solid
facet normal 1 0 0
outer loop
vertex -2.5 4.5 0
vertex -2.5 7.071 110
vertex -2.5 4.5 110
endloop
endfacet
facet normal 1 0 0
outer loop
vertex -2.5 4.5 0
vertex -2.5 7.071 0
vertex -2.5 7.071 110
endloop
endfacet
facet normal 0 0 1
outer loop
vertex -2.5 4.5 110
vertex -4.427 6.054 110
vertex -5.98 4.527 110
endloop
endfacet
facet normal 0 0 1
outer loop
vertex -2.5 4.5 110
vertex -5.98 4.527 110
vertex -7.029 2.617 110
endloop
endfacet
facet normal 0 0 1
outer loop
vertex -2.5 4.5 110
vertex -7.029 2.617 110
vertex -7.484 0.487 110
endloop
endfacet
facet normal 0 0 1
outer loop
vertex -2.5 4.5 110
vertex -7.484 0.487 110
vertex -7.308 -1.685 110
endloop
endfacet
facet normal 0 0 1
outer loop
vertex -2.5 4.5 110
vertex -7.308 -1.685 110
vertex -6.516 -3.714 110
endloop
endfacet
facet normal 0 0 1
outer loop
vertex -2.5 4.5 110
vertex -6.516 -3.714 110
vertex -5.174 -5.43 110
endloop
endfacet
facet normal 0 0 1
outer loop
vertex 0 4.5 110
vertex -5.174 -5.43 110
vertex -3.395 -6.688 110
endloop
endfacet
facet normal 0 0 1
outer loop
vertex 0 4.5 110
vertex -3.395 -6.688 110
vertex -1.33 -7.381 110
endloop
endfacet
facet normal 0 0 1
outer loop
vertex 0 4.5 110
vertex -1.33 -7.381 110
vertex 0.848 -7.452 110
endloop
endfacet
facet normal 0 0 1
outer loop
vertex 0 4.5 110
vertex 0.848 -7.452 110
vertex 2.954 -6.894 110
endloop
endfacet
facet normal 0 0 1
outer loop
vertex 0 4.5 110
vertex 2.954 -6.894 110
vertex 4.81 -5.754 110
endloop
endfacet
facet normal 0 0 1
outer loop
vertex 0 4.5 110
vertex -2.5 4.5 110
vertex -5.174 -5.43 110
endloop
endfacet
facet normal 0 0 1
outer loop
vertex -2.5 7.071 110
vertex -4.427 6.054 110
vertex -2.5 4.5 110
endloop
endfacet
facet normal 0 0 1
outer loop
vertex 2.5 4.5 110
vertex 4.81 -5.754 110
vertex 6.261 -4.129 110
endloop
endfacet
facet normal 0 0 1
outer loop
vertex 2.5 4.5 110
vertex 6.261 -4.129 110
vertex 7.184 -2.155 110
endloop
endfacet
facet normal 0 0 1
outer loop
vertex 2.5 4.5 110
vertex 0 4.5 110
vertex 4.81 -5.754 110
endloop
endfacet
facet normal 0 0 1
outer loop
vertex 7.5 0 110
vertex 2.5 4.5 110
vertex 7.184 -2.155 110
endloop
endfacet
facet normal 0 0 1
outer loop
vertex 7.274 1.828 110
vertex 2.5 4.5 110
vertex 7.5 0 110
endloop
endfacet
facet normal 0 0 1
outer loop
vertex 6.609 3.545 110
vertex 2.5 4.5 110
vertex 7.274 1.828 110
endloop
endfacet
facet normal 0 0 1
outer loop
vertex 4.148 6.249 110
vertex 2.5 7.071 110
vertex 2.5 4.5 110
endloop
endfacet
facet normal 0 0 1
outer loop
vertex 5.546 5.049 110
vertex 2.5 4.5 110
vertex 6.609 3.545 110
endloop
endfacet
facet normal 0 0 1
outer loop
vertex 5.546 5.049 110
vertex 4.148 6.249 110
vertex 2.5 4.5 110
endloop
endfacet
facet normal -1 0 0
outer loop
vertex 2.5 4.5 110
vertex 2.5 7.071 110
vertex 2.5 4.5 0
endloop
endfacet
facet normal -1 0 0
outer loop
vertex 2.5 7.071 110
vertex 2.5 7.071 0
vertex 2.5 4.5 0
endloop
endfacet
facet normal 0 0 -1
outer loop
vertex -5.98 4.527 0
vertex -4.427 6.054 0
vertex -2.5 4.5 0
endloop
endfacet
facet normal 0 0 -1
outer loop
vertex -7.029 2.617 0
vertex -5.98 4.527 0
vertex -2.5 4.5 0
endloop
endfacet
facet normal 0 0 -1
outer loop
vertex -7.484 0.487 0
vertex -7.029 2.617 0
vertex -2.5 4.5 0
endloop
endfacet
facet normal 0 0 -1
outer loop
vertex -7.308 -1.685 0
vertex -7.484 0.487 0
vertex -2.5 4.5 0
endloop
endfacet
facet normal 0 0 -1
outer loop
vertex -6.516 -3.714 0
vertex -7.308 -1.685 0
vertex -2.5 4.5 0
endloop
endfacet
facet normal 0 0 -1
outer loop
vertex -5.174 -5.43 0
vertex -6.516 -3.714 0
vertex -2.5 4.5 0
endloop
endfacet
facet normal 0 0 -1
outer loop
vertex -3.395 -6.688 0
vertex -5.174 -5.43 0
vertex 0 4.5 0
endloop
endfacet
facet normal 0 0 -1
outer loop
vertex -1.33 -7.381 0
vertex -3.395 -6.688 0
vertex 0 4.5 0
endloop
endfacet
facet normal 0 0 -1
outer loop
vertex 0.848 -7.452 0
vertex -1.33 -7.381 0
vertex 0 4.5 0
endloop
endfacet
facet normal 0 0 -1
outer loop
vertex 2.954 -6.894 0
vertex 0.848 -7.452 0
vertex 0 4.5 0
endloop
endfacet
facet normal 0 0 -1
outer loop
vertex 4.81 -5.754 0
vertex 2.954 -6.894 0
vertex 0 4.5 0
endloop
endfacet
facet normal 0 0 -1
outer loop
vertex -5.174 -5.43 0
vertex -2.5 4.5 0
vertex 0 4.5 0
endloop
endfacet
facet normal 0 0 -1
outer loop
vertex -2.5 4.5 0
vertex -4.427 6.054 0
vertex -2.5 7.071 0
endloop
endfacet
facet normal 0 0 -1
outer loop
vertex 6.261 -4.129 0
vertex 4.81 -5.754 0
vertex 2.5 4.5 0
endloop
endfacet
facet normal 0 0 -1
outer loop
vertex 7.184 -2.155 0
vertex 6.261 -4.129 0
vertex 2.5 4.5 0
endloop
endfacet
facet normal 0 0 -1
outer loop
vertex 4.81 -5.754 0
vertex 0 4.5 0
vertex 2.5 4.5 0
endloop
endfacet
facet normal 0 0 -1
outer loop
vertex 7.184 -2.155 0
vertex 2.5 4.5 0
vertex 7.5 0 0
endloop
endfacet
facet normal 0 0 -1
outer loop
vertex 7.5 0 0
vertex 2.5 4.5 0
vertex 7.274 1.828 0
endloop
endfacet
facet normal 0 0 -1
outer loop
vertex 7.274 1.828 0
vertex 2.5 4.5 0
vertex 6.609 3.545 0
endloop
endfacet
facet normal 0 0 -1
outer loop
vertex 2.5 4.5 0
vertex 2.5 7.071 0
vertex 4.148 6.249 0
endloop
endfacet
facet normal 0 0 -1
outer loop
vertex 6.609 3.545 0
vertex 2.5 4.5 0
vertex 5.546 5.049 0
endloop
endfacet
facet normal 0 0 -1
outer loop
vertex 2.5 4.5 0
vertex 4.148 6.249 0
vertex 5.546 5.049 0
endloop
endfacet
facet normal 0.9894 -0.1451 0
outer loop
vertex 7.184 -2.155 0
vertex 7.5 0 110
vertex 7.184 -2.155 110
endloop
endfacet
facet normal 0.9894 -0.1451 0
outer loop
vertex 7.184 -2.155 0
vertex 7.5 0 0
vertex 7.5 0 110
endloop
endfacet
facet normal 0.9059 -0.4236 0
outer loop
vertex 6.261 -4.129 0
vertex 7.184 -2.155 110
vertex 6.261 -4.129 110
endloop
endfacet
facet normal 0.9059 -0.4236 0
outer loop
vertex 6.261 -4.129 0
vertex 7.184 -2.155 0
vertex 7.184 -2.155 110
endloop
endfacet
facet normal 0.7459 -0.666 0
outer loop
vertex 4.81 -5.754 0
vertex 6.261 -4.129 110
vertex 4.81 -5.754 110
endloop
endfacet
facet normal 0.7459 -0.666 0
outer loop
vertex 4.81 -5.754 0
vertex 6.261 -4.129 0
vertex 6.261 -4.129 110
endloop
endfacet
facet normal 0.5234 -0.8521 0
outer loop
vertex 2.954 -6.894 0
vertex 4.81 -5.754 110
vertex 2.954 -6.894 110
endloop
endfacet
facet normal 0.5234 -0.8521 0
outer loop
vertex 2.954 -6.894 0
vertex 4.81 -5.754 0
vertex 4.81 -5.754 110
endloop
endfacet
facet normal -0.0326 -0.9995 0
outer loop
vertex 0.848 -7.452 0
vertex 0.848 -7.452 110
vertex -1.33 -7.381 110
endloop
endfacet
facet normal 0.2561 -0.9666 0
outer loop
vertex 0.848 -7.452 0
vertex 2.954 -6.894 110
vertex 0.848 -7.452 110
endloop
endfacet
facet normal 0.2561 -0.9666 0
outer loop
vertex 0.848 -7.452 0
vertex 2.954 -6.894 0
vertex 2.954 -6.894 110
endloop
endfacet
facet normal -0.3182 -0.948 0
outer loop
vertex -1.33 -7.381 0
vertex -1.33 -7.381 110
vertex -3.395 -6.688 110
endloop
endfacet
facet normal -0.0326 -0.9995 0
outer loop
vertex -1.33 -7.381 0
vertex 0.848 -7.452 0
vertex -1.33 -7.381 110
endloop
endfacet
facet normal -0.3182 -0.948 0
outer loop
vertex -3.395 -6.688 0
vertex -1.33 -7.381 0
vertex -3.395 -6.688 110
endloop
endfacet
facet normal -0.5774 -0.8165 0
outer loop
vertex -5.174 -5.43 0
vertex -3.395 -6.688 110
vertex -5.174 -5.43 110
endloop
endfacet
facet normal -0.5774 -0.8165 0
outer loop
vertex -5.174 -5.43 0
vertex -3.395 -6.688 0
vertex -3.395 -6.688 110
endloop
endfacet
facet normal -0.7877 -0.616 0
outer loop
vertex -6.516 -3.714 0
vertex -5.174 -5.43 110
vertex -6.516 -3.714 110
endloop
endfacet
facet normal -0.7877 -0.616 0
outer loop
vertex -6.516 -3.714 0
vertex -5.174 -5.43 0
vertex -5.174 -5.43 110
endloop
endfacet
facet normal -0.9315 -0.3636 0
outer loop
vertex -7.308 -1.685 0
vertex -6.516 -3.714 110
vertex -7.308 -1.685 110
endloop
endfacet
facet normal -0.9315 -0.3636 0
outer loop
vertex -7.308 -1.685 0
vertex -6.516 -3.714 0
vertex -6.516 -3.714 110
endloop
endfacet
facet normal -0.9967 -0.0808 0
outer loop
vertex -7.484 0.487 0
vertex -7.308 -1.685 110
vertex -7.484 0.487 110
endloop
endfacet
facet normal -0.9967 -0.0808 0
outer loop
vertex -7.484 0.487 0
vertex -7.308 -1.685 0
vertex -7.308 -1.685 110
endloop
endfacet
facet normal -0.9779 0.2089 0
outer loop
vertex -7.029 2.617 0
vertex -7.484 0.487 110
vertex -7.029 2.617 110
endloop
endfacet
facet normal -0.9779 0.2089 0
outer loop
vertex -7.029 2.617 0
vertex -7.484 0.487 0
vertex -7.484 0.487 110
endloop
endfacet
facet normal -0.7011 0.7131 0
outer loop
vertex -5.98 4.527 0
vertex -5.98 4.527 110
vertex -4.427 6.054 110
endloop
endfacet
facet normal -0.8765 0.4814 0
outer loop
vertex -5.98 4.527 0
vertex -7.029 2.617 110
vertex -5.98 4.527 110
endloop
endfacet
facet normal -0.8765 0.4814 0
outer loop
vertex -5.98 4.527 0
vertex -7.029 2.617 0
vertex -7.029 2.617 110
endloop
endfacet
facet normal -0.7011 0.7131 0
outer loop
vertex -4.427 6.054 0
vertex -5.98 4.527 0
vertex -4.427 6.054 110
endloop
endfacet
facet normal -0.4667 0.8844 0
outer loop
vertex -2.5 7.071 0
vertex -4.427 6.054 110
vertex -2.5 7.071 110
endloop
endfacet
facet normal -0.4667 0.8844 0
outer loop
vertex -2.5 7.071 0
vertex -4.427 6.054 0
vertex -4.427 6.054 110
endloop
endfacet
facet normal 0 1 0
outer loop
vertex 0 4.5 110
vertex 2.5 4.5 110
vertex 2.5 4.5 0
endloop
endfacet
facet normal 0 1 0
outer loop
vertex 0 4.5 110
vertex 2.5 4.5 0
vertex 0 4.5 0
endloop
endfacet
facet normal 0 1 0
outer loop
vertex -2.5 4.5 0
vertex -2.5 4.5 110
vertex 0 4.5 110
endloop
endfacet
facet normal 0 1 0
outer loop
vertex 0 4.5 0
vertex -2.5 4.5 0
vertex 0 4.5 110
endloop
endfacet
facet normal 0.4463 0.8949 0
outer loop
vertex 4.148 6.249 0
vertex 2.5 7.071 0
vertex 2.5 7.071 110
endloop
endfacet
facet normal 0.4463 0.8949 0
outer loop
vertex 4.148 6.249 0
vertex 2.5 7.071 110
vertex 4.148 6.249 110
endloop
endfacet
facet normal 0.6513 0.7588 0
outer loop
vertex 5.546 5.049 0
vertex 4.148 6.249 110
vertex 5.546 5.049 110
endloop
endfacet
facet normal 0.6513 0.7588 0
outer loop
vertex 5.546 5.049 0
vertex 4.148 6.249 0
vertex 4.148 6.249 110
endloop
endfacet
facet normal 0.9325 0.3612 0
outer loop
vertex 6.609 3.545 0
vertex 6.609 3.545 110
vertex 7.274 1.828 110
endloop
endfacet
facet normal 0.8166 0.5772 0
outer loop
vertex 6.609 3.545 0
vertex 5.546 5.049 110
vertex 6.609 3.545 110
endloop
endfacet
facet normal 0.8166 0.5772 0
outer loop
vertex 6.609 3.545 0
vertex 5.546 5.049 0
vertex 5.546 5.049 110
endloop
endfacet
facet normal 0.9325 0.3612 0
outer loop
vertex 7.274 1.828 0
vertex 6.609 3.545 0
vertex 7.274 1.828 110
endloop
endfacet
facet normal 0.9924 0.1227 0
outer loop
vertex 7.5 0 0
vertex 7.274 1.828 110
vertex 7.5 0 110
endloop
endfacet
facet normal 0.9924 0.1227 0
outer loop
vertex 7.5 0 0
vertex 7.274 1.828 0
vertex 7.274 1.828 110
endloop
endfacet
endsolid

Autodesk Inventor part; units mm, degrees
ref_plane "YZ Plane" through (0, 0, 0) normal (1, 0, 0) x (0, 1, 0)
ref_plane "XZ Plane" through (0, 0, 0) normal (0, 1, 0) x (-1, 0, 0)
ref_plane "XY Plane" through (0, 0, 0) normal (0, 0, 1) x (1, 0, 0)
sketch "Sketch1" plane through (0, 0, 0) normal (0, 0, 1) x (1, 0, 0)
  circle A0 centre (0, 0) radius 7.5
  line L0 (0, 7.5) -> (-2.5, 7.5)
  line L1 (-2.5, 7.5) -> (-2.5, 4.5)
  line L2 (-2.5, 4.5) -> (0, 4.5)
  line L3 (0, 4.5) -> (0, 7.5)
  line L4 (0, 7.5) -> (2.5, 7.5)
  line L5 (2.5, 7.5) -> (2.5, 4.5)
  line L6 (2.5, 4.5) -> (0, 4.5)
  point P0 (-2.5, 7.0711)
  point P1 (2.5, 7.0711)
  dimension "d0" = 15
  dimension "d1" = 3
  dimension "d2" = 2.5
extrude "Extrusion1" add sketch "Sketch1" along normal blind 110 contours A0 L1 L2 L6 L5
properties part number "shaft_with_keyway"
